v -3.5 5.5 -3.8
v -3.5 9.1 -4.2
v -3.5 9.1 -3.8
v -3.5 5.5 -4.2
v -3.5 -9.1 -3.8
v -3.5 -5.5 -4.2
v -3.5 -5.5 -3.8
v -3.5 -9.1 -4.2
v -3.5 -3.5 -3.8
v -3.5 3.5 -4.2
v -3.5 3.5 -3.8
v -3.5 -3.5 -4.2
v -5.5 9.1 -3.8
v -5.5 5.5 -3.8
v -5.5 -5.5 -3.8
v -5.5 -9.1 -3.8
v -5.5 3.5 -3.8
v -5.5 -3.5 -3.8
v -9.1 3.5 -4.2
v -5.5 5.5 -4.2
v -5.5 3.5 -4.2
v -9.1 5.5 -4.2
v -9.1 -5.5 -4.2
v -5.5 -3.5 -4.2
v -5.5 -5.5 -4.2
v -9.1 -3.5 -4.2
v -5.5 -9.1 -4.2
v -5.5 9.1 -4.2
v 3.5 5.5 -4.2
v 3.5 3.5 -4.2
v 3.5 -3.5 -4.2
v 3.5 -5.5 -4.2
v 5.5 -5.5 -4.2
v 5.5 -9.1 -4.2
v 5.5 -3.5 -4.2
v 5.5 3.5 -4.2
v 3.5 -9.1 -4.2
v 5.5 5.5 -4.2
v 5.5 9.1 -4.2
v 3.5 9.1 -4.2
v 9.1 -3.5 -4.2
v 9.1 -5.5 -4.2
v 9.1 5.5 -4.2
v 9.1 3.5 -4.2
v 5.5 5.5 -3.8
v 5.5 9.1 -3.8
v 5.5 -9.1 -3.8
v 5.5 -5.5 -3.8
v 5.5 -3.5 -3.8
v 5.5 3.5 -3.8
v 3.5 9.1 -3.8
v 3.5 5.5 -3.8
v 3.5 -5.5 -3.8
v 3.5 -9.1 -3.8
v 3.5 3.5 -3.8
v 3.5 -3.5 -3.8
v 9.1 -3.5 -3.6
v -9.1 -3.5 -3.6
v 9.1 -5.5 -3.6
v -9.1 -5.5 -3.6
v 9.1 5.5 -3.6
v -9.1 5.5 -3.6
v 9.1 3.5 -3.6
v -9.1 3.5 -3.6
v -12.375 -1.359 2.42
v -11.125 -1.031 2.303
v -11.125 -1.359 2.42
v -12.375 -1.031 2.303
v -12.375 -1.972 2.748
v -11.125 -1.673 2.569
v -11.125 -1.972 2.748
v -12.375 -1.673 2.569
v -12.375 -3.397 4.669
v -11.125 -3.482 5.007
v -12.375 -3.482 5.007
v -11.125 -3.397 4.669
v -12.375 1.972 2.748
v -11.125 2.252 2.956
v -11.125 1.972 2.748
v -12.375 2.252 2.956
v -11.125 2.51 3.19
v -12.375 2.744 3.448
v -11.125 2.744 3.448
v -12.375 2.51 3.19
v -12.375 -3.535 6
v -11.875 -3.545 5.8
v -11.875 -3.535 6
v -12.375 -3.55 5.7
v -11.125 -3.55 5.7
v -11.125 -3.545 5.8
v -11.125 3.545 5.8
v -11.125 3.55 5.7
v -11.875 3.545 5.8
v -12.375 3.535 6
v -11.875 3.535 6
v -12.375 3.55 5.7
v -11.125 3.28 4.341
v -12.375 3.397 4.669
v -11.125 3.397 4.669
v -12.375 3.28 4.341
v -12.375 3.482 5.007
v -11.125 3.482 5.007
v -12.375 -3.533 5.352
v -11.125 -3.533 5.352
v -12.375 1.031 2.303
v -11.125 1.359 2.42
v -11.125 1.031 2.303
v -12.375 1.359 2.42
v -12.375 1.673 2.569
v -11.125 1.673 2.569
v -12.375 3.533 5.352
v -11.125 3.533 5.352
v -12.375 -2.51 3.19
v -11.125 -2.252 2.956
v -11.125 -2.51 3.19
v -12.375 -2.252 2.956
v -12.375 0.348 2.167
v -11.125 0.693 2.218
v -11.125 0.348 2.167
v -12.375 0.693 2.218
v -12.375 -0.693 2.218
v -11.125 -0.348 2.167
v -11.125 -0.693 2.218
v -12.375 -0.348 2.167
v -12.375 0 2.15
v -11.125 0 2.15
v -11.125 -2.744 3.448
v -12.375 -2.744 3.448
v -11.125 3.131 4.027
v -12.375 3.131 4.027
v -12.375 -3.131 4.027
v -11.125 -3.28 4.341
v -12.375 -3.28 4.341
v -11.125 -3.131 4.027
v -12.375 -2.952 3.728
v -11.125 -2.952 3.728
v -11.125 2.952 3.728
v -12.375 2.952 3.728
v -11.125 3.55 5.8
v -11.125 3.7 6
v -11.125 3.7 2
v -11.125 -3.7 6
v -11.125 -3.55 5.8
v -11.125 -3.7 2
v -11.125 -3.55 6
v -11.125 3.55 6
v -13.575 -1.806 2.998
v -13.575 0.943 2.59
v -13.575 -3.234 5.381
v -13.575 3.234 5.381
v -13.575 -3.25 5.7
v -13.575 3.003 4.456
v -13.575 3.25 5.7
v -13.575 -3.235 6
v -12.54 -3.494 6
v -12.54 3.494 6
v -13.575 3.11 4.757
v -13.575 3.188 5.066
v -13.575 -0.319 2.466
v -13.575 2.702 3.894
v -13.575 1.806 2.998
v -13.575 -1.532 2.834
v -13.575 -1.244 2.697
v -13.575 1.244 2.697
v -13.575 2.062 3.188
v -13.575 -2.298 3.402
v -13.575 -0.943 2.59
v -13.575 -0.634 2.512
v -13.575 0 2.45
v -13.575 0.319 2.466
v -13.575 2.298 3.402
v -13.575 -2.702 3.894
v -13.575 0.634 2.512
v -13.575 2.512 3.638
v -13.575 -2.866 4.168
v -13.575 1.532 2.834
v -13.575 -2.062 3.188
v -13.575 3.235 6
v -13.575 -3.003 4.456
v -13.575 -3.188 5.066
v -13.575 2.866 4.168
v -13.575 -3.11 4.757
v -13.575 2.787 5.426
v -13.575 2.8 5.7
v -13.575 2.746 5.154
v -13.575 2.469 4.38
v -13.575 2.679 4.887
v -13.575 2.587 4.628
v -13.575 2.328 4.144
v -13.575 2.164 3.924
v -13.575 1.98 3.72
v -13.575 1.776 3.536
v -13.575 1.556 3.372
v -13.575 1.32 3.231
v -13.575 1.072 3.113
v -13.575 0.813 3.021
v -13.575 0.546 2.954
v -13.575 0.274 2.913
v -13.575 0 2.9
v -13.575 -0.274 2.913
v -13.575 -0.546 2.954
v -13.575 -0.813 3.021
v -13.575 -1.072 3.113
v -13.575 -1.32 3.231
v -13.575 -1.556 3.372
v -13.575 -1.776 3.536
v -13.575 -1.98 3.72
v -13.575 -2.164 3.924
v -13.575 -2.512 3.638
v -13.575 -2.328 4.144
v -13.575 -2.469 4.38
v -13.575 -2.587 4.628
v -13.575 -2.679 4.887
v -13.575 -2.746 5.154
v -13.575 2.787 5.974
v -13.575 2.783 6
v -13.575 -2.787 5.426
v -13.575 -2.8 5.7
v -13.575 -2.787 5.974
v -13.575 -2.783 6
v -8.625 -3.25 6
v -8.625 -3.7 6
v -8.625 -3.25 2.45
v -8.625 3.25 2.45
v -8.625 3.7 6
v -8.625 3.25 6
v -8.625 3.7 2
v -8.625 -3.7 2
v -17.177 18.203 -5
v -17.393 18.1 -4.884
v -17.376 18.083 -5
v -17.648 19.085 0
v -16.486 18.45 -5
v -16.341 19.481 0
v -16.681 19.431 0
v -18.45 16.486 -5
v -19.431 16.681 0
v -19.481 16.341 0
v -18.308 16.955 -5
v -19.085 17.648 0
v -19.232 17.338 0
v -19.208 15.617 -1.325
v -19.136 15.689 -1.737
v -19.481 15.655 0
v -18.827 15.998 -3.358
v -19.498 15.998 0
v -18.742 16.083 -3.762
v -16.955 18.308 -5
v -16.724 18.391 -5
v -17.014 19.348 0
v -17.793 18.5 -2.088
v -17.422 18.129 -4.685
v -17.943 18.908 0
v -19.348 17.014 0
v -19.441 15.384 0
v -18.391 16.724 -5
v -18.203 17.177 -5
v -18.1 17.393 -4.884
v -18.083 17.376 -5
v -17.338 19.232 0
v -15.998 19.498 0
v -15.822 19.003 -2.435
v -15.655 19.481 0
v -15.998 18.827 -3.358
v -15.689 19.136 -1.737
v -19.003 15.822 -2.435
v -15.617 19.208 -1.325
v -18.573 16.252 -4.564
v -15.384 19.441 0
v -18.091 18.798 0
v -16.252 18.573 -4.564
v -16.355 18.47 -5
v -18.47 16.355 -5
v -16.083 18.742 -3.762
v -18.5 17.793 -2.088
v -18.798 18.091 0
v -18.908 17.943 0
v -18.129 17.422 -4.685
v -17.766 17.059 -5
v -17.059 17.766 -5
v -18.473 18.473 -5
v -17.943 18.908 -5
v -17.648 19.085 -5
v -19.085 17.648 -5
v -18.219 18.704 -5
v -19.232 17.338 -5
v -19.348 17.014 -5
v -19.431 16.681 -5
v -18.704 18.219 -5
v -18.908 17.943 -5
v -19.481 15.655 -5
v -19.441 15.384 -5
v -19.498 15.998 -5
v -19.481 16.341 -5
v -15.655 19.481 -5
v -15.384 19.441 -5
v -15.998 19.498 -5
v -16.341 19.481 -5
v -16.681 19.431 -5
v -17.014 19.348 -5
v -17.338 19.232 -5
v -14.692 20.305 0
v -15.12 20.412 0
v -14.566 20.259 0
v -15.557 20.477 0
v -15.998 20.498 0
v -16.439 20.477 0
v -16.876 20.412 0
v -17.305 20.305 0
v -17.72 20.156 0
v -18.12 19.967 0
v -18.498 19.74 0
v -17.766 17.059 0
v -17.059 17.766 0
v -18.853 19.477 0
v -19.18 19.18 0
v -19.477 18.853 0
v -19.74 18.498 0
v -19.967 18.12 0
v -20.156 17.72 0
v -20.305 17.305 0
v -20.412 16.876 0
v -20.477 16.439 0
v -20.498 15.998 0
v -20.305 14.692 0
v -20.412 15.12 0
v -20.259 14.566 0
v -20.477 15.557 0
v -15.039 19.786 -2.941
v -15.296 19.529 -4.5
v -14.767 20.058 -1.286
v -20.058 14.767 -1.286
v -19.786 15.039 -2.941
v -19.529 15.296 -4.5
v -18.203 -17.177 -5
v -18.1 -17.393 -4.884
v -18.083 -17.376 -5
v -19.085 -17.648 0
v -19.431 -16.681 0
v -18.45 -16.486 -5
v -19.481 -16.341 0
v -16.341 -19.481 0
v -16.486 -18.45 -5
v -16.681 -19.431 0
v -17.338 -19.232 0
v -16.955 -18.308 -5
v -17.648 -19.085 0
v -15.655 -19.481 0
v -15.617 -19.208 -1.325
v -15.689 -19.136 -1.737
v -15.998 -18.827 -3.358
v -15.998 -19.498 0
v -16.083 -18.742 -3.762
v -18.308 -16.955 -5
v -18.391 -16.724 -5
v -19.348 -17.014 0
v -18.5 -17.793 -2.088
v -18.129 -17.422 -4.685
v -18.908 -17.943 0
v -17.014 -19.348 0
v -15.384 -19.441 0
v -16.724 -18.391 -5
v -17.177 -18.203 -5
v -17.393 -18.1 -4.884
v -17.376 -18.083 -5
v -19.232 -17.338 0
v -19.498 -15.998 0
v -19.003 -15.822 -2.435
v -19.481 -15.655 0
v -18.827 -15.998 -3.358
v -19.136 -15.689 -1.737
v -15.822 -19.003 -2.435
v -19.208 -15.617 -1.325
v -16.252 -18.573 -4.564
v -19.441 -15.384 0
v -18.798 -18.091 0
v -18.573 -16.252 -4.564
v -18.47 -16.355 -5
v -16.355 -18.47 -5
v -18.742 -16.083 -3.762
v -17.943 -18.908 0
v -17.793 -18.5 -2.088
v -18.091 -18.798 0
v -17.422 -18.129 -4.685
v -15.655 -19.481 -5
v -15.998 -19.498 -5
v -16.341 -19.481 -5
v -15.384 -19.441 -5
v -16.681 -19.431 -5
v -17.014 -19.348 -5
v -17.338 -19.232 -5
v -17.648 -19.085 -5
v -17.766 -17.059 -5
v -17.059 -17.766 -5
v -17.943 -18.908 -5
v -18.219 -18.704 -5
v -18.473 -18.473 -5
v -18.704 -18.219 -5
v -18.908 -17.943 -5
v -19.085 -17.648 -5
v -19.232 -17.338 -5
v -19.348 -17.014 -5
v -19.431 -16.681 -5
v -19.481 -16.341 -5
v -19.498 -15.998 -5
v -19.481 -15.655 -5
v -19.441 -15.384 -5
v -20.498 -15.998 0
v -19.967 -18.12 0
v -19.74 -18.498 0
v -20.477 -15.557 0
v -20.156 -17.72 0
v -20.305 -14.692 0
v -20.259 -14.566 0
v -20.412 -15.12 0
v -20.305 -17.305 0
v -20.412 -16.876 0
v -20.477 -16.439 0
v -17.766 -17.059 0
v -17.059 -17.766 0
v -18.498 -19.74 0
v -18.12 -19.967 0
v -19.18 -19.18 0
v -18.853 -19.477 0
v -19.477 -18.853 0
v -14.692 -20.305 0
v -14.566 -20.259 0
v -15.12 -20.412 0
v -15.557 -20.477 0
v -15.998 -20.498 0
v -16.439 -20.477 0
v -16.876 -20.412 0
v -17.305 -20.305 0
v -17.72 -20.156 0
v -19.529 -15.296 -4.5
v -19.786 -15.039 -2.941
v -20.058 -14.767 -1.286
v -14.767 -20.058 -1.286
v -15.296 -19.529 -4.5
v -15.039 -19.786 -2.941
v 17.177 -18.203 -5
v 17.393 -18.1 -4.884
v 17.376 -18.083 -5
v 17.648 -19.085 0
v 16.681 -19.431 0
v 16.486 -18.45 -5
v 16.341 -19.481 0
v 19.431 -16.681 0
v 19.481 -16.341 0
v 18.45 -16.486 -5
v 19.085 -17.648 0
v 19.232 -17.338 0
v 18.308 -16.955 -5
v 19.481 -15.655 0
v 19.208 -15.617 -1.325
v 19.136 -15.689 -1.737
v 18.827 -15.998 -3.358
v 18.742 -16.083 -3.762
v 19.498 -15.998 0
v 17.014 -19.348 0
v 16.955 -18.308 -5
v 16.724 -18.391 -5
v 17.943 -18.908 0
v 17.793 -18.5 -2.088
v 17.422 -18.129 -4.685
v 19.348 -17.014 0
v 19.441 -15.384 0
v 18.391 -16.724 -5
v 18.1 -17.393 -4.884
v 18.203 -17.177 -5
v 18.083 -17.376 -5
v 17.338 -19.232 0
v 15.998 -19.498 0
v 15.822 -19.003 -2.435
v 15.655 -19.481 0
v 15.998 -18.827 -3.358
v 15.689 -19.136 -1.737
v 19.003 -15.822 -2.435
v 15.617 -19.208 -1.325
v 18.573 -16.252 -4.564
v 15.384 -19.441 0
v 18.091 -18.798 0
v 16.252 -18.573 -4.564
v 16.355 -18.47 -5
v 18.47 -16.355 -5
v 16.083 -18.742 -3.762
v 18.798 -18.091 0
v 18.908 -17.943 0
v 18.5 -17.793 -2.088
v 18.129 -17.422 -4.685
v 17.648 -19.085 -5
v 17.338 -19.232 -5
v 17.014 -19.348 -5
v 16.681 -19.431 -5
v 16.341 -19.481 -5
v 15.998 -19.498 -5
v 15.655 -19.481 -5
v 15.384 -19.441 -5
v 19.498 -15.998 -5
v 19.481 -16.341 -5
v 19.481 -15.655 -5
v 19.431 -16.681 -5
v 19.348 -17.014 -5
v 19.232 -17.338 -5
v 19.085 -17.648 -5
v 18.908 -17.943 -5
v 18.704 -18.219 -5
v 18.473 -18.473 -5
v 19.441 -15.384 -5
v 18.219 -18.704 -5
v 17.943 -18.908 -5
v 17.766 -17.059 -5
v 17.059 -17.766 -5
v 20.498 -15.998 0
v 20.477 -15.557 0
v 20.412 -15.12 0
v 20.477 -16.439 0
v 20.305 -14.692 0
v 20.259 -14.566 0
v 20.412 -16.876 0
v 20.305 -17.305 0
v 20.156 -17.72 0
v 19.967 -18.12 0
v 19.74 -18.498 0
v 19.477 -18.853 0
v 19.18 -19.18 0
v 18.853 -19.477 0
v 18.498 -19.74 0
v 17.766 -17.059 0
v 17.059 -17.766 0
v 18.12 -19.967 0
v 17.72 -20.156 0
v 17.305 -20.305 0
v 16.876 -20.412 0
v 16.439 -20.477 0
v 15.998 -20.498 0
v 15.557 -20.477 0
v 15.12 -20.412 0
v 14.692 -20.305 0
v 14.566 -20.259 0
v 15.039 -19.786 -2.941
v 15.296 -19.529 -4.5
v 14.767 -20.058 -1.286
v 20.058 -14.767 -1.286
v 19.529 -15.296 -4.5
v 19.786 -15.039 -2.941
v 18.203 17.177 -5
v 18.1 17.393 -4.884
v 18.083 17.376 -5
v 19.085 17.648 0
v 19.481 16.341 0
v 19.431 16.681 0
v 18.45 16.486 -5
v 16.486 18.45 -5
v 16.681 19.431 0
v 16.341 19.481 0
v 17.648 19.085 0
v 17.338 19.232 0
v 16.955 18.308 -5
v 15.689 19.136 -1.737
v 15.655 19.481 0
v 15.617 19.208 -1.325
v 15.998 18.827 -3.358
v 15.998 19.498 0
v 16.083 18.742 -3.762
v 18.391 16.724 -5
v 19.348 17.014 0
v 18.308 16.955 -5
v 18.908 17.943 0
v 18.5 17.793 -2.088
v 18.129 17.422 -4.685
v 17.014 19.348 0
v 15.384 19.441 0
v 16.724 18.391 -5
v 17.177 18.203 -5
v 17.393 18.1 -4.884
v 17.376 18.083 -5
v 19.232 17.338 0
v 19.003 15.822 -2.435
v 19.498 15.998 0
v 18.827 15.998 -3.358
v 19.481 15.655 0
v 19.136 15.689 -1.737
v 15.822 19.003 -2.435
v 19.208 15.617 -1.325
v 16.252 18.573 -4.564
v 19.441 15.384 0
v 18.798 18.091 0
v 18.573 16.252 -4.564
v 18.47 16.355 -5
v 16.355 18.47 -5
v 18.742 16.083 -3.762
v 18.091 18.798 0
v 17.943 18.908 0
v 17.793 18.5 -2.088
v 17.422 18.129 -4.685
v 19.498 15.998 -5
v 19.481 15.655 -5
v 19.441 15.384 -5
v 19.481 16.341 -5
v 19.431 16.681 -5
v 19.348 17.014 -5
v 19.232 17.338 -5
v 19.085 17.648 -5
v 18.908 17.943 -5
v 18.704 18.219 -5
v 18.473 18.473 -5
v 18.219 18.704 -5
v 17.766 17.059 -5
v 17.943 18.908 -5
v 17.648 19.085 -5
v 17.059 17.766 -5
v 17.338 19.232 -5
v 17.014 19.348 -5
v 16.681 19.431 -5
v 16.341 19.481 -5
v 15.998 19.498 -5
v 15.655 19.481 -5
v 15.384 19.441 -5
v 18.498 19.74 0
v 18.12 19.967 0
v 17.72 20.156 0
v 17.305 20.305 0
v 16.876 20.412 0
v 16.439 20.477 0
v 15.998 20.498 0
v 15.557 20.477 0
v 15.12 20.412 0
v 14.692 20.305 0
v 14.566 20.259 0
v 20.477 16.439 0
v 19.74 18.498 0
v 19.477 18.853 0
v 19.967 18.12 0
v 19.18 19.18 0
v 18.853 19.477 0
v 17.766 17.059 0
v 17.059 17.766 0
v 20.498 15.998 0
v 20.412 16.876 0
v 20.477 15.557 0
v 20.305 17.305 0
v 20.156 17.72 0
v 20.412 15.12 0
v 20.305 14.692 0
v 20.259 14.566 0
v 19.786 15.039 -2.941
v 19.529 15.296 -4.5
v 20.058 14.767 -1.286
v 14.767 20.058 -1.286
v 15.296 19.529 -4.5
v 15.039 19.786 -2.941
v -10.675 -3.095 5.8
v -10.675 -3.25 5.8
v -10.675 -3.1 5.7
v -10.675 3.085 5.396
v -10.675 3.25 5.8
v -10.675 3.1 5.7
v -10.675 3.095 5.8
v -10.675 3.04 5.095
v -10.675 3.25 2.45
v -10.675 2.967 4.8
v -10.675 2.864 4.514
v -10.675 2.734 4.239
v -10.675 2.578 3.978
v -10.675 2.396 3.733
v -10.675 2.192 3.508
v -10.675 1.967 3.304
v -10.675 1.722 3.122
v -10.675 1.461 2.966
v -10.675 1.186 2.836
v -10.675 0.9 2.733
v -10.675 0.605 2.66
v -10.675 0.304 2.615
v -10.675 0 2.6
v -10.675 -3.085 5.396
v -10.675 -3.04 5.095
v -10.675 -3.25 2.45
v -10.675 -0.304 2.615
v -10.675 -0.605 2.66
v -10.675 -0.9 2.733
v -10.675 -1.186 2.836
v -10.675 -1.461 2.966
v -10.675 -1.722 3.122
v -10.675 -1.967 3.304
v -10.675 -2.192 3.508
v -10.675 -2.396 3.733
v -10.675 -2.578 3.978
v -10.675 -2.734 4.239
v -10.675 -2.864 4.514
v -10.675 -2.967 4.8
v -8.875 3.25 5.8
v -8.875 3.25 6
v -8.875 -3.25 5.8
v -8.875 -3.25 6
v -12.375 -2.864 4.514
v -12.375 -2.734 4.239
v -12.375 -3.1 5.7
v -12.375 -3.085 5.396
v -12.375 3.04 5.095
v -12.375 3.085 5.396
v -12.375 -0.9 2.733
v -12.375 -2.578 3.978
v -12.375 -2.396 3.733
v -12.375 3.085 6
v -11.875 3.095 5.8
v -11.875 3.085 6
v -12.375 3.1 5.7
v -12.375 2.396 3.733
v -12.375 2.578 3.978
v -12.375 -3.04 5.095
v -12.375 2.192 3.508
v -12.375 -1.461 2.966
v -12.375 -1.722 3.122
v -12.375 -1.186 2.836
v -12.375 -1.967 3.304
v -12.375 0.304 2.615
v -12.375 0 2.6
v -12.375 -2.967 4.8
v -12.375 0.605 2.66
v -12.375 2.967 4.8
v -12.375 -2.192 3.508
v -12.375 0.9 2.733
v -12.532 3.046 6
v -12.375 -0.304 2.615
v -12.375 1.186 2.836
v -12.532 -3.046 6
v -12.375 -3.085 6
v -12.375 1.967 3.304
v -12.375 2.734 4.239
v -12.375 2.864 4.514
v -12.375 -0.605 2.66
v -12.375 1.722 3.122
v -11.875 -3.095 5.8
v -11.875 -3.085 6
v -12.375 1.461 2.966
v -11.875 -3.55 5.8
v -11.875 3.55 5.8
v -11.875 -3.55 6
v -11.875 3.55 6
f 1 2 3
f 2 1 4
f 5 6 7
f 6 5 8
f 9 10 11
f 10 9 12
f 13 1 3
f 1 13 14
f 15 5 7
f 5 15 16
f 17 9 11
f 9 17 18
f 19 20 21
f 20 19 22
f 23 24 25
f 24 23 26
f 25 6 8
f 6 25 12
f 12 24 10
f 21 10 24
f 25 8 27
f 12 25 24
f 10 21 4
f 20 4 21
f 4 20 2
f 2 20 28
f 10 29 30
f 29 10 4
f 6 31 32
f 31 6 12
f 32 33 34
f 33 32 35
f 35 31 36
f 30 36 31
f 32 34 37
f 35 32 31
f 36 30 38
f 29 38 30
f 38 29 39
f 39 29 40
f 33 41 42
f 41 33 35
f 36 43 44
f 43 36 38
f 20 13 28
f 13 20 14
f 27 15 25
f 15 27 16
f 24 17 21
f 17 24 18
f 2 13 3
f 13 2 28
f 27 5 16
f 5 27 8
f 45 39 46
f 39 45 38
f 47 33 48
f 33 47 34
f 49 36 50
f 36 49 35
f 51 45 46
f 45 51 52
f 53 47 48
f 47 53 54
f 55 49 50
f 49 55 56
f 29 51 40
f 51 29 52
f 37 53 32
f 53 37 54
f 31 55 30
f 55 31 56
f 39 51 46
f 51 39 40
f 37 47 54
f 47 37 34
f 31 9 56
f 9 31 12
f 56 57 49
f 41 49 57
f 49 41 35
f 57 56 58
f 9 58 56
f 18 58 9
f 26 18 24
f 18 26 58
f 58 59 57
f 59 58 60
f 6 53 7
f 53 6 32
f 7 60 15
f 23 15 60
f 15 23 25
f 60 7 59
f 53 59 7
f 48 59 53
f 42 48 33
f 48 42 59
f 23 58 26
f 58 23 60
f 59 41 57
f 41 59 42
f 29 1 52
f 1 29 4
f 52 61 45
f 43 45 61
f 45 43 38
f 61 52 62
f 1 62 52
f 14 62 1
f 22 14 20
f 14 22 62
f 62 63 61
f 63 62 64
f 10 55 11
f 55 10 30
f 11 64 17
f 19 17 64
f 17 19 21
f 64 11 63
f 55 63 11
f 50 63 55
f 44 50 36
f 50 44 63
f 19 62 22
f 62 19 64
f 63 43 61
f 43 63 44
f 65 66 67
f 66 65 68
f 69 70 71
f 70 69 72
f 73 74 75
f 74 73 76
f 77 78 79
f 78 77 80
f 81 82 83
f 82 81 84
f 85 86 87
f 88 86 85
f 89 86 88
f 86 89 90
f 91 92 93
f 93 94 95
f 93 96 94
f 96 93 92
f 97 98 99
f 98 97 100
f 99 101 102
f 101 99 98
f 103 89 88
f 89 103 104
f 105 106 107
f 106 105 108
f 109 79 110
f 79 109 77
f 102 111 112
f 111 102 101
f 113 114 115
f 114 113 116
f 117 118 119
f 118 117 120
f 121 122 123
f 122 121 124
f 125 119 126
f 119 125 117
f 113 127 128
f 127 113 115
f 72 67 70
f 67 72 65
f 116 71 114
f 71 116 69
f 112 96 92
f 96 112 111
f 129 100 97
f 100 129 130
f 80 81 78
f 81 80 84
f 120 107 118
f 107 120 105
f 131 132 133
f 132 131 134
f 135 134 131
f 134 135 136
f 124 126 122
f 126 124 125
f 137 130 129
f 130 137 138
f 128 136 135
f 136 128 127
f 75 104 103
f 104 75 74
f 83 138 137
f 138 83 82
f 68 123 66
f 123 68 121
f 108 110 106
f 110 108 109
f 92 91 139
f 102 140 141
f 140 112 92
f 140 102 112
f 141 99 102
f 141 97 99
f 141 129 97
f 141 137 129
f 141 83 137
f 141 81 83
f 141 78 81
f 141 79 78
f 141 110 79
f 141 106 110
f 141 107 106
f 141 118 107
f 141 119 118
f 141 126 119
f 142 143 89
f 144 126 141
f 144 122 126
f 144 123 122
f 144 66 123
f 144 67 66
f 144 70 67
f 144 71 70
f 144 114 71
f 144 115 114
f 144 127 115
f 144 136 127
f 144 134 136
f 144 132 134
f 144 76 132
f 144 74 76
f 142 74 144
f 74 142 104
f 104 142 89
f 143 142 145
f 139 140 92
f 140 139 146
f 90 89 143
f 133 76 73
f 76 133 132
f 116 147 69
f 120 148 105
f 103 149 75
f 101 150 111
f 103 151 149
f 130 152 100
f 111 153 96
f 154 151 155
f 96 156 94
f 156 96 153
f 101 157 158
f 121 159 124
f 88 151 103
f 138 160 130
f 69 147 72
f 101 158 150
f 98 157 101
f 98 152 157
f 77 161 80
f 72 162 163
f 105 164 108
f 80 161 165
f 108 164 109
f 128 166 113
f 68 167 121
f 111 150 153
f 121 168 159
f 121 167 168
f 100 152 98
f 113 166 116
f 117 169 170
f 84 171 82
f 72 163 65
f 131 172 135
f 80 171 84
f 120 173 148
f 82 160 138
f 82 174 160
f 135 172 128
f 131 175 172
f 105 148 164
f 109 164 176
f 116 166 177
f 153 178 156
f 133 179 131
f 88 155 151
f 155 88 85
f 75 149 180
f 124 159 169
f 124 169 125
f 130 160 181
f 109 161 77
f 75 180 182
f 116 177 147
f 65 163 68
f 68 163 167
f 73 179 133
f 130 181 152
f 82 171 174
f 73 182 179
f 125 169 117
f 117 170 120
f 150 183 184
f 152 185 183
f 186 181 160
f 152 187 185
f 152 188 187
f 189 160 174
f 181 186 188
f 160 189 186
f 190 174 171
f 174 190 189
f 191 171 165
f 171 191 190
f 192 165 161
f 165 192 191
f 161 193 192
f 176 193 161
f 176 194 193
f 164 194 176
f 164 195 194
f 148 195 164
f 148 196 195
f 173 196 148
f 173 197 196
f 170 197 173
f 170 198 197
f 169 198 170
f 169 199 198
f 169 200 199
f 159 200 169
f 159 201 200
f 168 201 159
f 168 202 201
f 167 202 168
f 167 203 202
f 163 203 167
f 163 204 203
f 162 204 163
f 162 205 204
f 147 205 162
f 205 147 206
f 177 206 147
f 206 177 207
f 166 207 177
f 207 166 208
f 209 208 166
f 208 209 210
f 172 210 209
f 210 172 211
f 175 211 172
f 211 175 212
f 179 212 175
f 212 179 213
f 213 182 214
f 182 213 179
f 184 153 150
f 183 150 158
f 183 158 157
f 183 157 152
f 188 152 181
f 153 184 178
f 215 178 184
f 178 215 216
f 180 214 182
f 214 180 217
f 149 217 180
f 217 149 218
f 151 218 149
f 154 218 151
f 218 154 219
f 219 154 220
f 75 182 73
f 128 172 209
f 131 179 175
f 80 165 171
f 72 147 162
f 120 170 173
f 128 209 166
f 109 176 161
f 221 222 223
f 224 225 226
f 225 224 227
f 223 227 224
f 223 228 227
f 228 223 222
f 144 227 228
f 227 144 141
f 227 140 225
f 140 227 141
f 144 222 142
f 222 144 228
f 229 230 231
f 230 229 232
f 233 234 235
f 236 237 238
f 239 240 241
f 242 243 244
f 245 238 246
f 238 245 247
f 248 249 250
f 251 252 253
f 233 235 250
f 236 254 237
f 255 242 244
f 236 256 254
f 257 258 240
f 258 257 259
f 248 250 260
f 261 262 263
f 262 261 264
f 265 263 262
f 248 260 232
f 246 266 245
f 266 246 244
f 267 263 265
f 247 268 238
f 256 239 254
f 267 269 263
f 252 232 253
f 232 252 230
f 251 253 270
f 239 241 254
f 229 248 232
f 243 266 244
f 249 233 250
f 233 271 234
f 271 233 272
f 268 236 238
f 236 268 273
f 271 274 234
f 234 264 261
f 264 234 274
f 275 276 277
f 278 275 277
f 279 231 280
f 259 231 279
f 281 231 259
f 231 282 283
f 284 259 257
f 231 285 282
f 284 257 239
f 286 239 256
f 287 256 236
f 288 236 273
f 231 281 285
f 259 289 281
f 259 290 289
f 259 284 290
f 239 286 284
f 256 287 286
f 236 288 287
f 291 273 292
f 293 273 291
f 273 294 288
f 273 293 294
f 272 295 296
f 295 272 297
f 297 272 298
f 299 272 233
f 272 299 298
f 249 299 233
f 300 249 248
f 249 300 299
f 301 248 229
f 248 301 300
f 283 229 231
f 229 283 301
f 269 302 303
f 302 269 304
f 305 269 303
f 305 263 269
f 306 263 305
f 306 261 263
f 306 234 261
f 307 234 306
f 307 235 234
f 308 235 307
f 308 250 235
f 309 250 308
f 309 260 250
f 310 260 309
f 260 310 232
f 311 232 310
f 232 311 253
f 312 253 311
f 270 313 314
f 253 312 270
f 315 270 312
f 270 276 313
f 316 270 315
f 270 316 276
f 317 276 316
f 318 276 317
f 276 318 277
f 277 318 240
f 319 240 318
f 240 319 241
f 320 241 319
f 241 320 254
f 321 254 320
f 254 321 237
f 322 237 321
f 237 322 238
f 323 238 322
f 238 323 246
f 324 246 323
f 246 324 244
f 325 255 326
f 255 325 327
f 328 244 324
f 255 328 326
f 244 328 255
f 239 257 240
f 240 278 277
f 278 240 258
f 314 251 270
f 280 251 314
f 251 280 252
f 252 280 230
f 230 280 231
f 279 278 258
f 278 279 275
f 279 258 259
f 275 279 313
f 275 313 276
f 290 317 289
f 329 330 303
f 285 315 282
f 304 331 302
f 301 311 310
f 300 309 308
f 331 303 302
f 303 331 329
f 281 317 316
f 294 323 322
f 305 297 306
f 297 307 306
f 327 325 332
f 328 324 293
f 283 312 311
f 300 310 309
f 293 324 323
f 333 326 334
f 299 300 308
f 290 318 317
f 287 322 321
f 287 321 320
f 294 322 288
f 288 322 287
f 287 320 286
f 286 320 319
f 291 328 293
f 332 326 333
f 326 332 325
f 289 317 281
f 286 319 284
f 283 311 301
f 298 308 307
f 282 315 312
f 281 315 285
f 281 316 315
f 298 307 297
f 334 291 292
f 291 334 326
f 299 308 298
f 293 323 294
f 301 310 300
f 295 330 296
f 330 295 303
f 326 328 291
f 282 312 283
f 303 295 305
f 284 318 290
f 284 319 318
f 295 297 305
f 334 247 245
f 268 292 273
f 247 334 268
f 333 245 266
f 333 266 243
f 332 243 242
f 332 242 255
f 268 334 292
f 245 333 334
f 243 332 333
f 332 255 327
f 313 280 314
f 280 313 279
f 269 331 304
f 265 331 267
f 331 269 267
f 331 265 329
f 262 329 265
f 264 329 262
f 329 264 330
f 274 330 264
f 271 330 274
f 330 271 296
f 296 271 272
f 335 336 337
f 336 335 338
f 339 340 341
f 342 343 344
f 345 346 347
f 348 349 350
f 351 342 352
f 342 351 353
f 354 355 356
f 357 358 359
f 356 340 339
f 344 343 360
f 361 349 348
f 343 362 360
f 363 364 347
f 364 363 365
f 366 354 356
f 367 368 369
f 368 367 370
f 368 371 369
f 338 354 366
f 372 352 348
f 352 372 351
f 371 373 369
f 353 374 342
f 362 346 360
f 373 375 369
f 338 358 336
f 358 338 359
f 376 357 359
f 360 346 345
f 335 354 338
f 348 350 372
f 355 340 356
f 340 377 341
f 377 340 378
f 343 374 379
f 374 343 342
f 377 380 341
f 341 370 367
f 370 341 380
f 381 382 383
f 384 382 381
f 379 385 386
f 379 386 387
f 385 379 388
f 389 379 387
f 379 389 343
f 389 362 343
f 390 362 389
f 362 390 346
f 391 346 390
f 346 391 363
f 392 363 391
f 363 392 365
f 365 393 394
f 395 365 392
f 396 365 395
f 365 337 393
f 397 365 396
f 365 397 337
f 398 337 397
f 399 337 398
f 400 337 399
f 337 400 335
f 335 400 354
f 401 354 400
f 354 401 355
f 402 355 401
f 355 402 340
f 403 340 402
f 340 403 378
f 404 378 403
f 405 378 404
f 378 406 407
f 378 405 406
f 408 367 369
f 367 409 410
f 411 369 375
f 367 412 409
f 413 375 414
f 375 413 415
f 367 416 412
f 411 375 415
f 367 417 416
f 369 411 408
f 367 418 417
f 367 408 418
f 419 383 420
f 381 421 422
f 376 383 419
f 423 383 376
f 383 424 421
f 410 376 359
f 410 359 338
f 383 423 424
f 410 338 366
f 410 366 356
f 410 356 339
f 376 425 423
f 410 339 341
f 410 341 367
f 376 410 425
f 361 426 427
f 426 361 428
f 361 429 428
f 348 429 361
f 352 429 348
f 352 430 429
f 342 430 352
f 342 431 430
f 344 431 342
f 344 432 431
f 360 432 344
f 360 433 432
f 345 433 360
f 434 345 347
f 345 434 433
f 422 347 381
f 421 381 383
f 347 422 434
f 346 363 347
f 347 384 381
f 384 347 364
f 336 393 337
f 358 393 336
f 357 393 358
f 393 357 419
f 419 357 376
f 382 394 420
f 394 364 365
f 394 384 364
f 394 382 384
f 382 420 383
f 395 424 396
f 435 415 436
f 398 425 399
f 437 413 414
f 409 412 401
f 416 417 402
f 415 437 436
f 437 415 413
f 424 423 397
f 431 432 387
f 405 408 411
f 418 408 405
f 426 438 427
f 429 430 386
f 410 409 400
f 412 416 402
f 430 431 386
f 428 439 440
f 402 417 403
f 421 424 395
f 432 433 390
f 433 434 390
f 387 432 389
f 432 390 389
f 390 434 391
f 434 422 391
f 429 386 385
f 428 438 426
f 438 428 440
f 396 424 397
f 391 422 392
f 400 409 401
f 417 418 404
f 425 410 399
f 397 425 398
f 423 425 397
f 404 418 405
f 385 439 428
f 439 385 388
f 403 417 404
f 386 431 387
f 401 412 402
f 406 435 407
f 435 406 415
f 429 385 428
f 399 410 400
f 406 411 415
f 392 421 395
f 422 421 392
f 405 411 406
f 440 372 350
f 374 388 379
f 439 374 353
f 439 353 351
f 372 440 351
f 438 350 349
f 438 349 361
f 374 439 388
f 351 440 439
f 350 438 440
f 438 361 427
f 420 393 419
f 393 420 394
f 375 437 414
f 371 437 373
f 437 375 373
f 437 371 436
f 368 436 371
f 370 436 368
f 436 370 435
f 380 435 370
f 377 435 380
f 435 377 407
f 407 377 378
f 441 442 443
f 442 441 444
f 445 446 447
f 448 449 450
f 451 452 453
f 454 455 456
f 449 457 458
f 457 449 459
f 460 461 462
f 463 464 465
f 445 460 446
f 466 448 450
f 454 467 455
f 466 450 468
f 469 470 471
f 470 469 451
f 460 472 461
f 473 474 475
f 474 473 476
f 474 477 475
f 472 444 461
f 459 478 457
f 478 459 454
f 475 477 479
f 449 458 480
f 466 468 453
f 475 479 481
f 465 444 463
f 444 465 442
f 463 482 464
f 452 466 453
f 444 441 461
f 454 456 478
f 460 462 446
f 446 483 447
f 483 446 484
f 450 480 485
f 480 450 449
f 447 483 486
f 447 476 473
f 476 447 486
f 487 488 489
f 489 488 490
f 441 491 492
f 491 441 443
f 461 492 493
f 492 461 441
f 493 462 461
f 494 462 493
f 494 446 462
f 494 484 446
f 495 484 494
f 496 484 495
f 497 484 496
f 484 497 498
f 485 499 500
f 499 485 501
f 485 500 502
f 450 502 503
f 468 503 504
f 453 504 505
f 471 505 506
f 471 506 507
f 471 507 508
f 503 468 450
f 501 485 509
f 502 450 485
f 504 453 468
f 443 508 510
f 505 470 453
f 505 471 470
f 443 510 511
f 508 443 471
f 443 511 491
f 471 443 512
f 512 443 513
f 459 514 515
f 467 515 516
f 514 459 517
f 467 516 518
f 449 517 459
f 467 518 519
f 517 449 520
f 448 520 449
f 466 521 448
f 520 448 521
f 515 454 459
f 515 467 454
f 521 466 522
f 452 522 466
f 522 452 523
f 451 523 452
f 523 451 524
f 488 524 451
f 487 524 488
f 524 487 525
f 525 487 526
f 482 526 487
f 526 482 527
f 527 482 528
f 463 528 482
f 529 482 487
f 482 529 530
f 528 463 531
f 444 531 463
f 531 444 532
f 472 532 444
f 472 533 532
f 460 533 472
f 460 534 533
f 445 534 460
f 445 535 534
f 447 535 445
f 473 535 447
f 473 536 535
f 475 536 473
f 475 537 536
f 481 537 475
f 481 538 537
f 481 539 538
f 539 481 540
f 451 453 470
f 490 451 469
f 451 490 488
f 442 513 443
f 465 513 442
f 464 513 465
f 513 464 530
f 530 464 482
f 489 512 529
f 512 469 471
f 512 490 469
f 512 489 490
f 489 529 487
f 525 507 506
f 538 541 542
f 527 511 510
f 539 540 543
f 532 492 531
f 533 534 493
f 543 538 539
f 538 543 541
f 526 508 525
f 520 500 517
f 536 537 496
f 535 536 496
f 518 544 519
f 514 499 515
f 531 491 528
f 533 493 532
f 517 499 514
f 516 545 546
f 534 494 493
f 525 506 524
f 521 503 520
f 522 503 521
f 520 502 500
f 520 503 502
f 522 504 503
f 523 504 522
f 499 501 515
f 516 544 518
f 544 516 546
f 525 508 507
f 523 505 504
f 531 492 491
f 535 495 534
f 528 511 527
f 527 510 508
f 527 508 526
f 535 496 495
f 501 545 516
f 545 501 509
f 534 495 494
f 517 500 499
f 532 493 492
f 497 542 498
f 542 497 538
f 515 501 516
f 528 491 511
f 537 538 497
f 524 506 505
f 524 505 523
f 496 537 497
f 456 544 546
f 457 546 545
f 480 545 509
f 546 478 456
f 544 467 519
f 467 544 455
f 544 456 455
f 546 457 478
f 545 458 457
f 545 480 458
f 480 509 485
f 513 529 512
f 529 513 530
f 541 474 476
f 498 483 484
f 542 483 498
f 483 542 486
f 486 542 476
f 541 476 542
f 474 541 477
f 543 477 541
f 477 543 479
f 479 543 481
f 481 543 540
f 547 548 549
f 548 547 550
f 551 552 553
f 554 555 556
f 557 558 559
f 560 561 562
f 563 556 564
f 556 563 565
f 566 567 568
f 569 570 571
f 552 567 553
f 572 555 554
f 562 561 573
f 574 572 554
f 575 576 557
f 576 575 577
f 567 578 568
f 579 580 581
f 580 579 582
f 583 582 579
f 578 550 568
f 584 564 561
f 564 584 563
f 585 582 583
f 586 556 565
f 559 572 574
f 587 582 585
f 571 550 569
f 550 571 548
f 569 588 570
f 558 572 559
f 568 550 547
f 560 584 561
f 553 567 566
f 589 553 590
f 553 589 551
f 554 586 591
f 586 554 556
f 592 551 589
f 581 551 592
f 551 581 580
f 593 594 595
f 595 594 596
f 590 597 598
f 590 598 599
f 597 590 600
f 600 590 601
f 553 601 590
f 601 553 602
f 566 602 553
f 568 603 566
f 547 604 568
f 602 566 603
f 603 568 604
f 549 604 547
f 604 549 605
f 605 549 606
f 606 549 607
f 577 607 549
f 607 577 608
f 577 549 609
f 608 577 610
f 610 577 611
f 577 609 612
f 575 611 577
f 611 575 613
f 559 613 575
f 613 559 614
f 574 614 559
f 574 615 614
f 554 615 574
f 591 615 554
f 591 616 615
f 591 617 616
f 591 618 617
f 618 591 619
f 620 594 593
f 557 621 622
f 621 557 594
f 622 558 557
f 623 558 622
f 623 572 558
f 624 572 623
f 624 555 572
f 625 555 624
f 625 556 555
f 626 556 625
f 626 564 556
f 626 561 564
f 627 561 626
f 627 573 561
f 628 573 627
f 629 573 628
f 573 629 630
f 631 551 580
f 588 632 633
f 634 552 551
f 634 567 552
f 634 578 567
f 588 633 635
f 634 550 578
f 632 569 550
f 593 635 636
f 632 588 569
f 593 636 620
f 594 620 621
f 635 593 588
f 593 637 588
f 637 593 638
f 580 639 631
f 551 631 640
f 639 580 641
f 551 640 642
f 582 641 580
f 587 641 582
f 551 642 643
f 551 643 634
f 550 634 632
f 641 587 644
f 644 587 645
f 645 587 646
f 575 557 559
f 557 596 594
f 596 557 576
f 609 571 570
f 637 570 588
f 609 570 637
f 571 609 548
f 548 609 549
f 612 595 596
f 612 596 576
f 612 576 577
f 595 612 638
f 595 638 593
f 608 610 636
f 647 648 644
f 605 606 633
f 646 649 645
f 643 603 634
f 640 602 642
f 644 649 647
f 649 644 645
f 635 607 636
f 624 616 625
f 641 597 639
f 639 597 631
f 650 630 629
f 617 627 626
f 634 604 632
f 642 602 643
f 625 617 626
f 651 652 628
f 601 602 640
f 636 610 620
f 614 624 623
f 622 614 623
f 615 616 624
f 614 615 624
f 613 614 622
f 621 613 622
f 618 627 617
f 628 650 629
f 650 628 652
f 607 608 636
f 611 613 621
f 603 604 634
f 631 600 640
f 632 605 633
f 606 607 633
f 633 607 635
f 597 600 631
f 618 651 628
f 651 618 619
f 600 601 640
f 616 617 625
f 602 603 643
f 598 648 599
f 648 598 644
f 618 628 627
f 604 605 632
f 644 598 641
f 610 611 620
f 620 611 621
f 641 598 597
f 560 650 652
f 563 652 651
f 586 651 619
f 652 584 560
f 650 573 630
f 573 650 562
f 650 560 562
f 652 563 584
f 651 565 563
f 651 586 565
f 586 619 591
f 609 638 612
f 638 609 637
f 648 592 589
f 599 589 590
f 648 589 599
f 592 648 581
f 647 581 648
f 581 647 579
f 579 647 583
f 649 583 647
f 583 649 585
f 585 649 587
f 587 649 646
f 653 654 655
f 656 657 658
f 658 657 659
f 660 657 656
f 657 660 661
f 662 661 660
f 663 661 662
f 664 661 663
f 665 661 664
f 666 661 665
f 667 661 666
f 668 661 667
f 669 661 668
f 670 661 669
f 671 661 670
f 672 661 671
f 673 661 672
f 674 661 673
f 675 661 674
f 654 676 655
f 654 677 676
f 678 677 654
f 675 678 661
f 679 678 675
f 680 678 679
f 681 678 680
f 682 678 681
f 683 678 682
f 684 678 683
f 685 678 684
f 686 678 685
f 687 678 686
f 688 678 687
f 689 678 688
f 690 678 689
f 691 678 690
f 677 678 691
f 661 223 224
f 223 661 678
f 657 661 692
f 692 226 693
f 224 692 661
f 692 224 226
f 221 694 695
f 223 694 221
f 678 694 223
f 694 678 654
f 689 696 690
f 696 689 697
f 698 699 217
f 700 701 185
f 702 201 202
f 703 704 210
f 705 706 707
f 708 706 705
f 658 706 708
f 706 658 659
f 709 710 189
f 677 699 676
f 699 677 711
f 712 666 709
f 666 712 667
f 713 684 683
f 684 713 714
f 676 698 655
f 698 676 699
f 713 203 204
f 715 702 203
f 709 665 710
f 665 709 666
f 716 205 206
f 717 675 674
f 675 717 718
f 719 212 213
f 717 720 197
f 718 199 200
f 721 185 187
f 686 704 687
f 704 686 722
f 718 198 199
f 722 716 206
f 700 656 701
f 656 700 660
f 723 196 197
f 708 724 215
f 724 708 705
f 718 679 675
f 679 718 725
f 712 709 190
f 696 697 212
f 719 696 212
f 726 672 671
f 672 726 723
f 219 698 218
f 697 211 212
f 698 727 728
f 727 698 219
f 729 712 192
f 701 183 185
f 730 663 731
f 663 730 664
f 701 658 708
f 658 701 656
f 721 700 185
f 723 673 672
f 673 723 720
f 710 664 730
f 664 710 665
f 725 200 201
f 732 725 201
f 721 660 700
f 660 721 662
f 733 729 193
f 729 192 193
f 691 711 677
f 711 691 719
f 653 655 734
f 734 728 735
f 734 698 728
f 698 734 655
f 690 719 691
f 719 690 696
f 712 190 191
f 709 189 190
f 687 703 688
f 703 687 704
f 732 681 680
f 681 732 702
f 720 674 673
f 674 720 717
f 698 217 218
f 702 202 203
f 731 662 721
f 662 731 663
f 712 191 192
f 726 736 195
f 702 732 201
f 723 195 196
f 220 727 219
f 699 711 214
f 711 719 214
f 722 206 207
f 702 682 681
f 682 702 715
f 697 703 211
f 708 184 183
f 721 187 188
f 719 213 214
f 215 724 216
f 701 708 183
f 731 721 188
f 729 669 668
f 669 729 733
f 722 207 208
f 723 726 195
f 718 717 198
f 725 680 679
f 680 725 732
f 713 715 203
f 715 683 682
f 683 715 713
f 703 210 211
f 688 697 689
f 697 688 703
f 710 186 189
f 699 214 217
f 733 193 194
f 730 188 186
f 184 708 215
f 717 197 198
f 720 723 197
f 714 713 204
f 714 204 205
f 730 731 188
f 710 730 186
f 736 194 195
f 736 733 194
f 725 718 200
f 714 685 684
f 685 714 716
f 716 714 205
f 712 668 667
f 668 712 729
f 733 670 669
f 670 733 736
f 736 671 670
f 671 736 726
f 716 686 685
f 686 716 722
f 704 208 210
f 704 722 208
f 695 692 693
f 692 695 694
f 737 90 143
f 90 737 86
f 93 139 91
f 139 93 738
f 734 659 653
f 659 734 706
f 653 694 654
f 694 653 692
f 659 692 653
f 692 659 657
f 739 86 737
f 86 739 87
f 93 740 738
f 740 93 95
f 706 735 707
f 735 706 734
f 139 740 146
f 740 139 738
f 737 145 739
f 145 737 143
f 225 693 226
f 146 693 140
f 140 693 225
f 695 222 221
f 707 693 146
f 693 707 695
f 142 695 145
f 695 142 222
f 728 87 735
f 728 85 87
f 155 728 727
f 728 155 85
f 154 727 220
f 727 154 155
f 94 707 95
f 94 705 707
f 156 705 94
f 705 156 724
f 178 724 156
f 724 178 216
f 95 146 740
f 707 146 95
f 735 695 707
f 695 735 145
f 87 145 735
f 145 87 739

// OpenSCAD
$fn=64;             // smooth round things
motor_g = 22.625;   // distance between motor's center and origin
motor_d = 6+.10;    // motor diameter

dxf="./main.dxf";

// charger hole:
chw=4.75;           // width
chh=3.15;           // height
ckw=2.6;            // key width
ckh=1.75;           // key height

cam_z=5.7;          // camera mount vertical alignment
cam_x=-8.625;
cam_rect_o = 7.4;   // camera rectangular box outer width
cam_rect_i = 6.5;   // camera rectangular box inner width
cam_rect_h = 2.5;
cam_cyl_h = 1.25;   // camera cylinder height
cam_cyl_d = 7.1;    // ...and outer diameter
cam_cone_h = 1.2;
cam_cone_d = 6.5;


charger_hole_supports = true;
camera_mount_enable = true;     // maybe you need a case for CX-10(A)
camera_mount_support = true;

feet_enable = true;

led_holes_support = true;

main();

module charger_hole() {
    if(charger_hole_supports) {
        translate([0,10,6-chh/2]) {
            translate([0,0,-.1]) cube([chw,5,chh-.2], center=true);
            translate([0,0,-chh/2-ckh/2-.1]) cube([ckw,5,ckh-.2], center=true);
        }
    } else {
        translate([0,10,6-chh/2]) {
            cube([chw,5,chh], center=true);
            translate([0,0,-chh/2-ckh/2]) cube([ckw,5,ckh], center=true);
        }
    }
}

module camera_mount_subtractive() {
    wall_w = (cam_rect_o-cam_rect_i)/2;
    cube_h = cam_rect_h-wall_w;
    /* all that dancing around hull() is due to openSCAD glitchy behavior
     * when subtracting few stacked objects from other object */
    union() {
        translate([0,0,cube_h/2]) cube([cam_rect_i, cam_rect_i, cube_h], center = true);
        hull() {
            cylinder(h = cam_cyl_h+wall_w+cube_h, d = cam_cyl_d-wall_w*2);
            translate([0,0,cube_h+wall_w+cam_cyl_h+cam_cone_h*.9])
                cylinder(h = cam_cone_h*.1, d = cam_cone_d-wall_w*2);
        }
    }
}

module camera_mount_additive() {
    rotate([0,0,0]) union() {
        translate([0,0,cam_rect_h/2]) cube([cam_rect_o,cam_rect_o,cam_rect_h], center = true);
        translate([0,0,cam_rect_h]) {
            cylinder(h = cam_cyl_h, d=cam_cyl_d);
            translate([0,0,cam_cyl_h]) cylinder(h = cam_cone_h, d1=cam_cyl_d, d2=cam_cone_d);
        }
    }
}

module single_foot() {
    rotate([0,0,45]) {
        translate([0,motor_g,-5]) {
            difference() {
                cylinder(d1 = 7, d2=9, h=5);
                difference() {
                    cylinder(d1 = 5, d2=7, h=5);
                    translate([0,1,2.5]) cube([1,9,5], center=true);
                }
                translate([-4.5,-7,0]) cube([9,9,5]);
            }
        }
    }   
}

module main() {
    difference() {
        union() {
            difference() {
                union() {
                    main_body();
                    if(camera_mount_enable)
                        translate([cam_x,0,cam_z]) rotate([0,-90,0]) camera_mount_additive();
                    if(feet_enable)
                        for(a=[0:3]) rotate([0,0,a*90]) single_foot();
                }
                charger_hole();
                if(camera_mount_enable)
                    translate([cam_x,0,cam_z]) rotate([0,-90,0]) camera_mount_subtractive();
            }
            if(camera_mount_enable&&camera_mount_support) translate([-20.75/2-0,0,6-.05]) cube([3,7.1,.3],true);
        }
        // cutoff everything above 6mm
        translate([-50,-50,6]) cube([100,100,100]);
    }
}

module main_body() {
    difference() {
        union() {
            to_center = 16.3207;
            between = 5.63;
            for(a=[0:3]) {
                rotate([0,0,90*a])
                    difference() {
                        linear_extrude(height = 6, convexity = 1) import(dxf, layer="arm");
                        cylinder(r1=to_center+between/2, r2=to_center-between/2, h = 2);
                        
                    }
            }
            translate([0,0,2-1.2]) linear_extrude(height = 4+1.2, convexity = 1) import(dxf, layer="battery compartment");
            //linear_extrude(height = 6, convexity = 1) import("Untitled.dxf", layer="arm contour");
            translate([0,0,5.5]) linear_extrude(height = .5, convexity = 1) import(dxf, layer="screwholes");
            translate([0,0,0]) linear_extrude(height = .5, convexity = 1) import(dxf, layer="motor stoppers");
            translate([0,0,1]) linear_extrude(height = 5, convexity = 1) import(dxf, layer="motor bushings");
            
            sp = 26.43;
            
            translate([0,0,2-1.2]) difference () {
                intersection() {
                    union() {
                        translate([0,0,sp]) sphere(30);
                        translate([0,0,-2.5]) cube([19,19,5], center = true);
                    }
                    translate([0,0,-10]) linear_extrude(height = 10, convexity = 1) import(dxf, layer="contour mask");
                }
                
                intersection() {
                    union() {
                        translate([0,0,sp]) sphere(29);
                        translate([0,0,-2.5]) cube([18.2,18.2,5], center = true);
                    }
                    translate([0,0,-10]) linear_extrude(height = 10, convexity = 1) import(dxf, layer="inner contour mask");
                }
            }
            translate([0,0,-5+2-1.2]) for(a=[0:1])
            {
                rotate([0,0,90*a]) for(b=[0:1])
                {
                    translate([18/4*(b*2-1), 0, 0.2+a*0.1]) cube([2, 18.2, 0.4+a*0.2], center = true);
                }
            }
        }
        
        // led holes
        led=1;
        for(a=[0:3]) {
            rotate([0,0,a*90+45]) {
                translate([motor_g,0,.5+3]) cylinder(h=6, center=true, d=motor_d);
                if(led_holes_support) {
                    translate([0,75-4,6-led/2-.1]) cube([3,100,led-.2], center=true);
                } else {
                    translate([0,75-4,6-led/2]) cube([3,100,led], center=true);
                }
            }
        }
    }
}
